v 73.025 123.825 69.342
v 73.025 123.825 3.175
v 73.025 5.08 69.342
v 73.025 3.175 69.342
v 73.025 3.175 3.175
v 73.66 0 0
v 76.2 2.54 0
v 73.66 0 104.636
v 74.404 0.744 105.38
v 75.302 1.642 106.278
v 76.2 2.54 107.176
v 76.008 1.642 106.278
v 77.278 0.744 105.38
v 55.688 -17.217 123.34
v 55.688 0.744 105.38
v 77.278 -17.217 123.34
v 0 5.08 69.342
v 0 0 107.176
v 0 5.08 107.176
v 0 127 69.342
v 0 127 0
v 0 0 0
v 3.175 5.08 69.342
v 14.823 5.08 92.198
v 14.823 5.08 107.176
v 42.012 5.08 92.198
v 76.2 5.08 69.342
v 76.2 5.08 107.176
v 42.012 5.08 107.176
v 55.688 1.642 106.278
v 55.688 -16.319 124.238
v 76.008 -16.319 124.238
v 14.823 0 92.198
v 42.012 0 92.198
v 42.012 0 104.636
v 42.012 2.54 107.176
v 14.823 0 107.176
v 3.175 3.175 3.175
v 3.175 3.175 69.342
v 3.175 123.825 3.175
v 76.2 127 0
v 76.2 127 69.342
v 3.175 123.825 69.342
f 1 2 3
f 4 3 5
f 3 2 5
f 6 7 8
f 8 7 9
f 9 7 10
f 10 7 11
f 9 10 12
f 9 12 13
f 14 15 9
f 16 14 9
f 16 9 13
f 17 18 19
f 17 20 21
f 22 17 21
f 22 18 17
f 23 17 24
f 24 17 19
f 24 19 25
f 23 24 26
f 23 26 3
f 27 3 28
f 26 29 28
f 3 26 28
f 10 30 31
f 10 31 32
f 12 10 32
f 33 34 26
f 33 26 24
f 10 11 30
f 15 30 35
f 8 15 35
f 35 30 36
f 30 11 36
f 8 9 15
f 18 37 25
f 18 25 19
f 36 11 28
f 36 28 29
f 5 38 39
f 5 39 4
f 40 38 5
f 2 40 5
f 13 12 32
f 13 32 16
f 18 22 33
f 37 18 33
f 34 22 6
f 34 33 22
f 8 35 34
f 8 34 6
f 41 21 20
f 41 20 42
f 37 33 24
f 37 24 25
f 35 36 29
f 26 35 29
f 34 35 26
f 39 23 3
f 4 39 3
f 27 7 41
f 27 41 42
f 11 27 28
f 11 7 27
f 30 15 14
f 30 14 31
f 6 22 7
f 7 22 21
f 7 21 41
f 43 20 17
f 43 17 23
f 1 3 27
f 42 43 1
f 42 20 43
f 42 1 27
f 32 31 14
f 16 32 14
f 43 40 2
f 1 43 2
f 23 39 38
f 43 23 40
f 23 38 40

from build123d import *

# Parameters (mm, degrees)
F0_W         = 76.2
F0_H         = 127
F1_DEPTH     = 69.342
F3_DEPTH     = 5.08
F4_T         = -3.175
F7_SIZE      = 2.54
F8_W         = 25.4
F8_H         = 1.27
F9_DEPTH     = 25.4
F10_T1_DEPTH = 38.4641495789


# Not quite as in the source:
# - a fillet or chamfer that OpenCascade refuses, or shapes differently, is made with other operations: its cross-section is extruded or revolved along the edge and cut away or added
# - a feature of the source that left no trace in its solid (it failed there, or was rolled back) is left out


with BuildPart() as f1:
    # F0 (on Top) → F1 (new body)
    with BuildSketch(Plane.XY):
        with Locations((38.1, 63.5)):
            Rectangle(F0_W, F0_H)
    extrude(amount=F1_DEPTH)

    # F2 (on face) → F3 (join)
    with BuildSketch(Plane.XZ):
        Polygon((0, 107.1759281516), (0, 69.342), (76.2, 69.342), (76.2, 107.1759281516), (42.011950165, 107.1759281516), (42.011950165, 92.1983985066), (14.8228770122, 92.1983985066), (14.8228770122, 107.1759281516), align=None)
    extrude(amount=-F3_DEPTH)

    # F4: a shell. OpenCascade refuses it in one call, so the cavity is built on its own and cut out:
    # the body offset inwards by the wall thickness, plus a prism from it out through each open face.
    f4_core = offset(f1.part, amount=F4_T, kind=Kind.INTERSECTION, mode=Mode.PRIVATE)
    f4_exits = [f4_core.faces().sort_by_distance(p)[0] for p in [
        (38.1, 63.5, 66.167),
    ]]
    add(f4_core, mode=Mode.SUBTRACT)
    extrude(f4_exits, amount=-F4_T, mode=Mode.SUBTRACT)

    # F7
    f7_edges = [f1.edges().sort_by_distance(p)[0] for p in [
        (59.105975, 0, 107.175928),
        (76.2, 0, 53.587964),
    ]]
    chamfer(f7_edges, length=F7_SIZE)

    # F8 (on face) → F9 (join)
    with BuildSketch(Plane(origin=(0, -52.3179640758, 52.3179640758), x_dir=(1, 0, 0), z_dir=(0, -0.7071067812, 0.7071067812))):
        with Locations((68.3882001948, 75.6758768002)):
            Rectangle(F8_W, F8_H)
    extrude(amount=F9_DEPTH)

    # F10: chamfer of 5.08 on 1 edges, made by hand

    # F10_s2 → F10_t1 (cut)
    with BuildSketch(Plane(origin=(0, -52.3179640758, 52.3179640758), x_dir=(1, 0, 0), z_dir=(0, -0.7071067812, 0.7071067812))):
        Polygon((76.0082001948, 76.3108768002), (81.0882001948, 71.2308768002), (81.0882001948, 76.3108768002), align=None)
    extrude(amount=F10_T1_DEPTH, mode=Mode.SUBTRACT)


solid = f1.part
